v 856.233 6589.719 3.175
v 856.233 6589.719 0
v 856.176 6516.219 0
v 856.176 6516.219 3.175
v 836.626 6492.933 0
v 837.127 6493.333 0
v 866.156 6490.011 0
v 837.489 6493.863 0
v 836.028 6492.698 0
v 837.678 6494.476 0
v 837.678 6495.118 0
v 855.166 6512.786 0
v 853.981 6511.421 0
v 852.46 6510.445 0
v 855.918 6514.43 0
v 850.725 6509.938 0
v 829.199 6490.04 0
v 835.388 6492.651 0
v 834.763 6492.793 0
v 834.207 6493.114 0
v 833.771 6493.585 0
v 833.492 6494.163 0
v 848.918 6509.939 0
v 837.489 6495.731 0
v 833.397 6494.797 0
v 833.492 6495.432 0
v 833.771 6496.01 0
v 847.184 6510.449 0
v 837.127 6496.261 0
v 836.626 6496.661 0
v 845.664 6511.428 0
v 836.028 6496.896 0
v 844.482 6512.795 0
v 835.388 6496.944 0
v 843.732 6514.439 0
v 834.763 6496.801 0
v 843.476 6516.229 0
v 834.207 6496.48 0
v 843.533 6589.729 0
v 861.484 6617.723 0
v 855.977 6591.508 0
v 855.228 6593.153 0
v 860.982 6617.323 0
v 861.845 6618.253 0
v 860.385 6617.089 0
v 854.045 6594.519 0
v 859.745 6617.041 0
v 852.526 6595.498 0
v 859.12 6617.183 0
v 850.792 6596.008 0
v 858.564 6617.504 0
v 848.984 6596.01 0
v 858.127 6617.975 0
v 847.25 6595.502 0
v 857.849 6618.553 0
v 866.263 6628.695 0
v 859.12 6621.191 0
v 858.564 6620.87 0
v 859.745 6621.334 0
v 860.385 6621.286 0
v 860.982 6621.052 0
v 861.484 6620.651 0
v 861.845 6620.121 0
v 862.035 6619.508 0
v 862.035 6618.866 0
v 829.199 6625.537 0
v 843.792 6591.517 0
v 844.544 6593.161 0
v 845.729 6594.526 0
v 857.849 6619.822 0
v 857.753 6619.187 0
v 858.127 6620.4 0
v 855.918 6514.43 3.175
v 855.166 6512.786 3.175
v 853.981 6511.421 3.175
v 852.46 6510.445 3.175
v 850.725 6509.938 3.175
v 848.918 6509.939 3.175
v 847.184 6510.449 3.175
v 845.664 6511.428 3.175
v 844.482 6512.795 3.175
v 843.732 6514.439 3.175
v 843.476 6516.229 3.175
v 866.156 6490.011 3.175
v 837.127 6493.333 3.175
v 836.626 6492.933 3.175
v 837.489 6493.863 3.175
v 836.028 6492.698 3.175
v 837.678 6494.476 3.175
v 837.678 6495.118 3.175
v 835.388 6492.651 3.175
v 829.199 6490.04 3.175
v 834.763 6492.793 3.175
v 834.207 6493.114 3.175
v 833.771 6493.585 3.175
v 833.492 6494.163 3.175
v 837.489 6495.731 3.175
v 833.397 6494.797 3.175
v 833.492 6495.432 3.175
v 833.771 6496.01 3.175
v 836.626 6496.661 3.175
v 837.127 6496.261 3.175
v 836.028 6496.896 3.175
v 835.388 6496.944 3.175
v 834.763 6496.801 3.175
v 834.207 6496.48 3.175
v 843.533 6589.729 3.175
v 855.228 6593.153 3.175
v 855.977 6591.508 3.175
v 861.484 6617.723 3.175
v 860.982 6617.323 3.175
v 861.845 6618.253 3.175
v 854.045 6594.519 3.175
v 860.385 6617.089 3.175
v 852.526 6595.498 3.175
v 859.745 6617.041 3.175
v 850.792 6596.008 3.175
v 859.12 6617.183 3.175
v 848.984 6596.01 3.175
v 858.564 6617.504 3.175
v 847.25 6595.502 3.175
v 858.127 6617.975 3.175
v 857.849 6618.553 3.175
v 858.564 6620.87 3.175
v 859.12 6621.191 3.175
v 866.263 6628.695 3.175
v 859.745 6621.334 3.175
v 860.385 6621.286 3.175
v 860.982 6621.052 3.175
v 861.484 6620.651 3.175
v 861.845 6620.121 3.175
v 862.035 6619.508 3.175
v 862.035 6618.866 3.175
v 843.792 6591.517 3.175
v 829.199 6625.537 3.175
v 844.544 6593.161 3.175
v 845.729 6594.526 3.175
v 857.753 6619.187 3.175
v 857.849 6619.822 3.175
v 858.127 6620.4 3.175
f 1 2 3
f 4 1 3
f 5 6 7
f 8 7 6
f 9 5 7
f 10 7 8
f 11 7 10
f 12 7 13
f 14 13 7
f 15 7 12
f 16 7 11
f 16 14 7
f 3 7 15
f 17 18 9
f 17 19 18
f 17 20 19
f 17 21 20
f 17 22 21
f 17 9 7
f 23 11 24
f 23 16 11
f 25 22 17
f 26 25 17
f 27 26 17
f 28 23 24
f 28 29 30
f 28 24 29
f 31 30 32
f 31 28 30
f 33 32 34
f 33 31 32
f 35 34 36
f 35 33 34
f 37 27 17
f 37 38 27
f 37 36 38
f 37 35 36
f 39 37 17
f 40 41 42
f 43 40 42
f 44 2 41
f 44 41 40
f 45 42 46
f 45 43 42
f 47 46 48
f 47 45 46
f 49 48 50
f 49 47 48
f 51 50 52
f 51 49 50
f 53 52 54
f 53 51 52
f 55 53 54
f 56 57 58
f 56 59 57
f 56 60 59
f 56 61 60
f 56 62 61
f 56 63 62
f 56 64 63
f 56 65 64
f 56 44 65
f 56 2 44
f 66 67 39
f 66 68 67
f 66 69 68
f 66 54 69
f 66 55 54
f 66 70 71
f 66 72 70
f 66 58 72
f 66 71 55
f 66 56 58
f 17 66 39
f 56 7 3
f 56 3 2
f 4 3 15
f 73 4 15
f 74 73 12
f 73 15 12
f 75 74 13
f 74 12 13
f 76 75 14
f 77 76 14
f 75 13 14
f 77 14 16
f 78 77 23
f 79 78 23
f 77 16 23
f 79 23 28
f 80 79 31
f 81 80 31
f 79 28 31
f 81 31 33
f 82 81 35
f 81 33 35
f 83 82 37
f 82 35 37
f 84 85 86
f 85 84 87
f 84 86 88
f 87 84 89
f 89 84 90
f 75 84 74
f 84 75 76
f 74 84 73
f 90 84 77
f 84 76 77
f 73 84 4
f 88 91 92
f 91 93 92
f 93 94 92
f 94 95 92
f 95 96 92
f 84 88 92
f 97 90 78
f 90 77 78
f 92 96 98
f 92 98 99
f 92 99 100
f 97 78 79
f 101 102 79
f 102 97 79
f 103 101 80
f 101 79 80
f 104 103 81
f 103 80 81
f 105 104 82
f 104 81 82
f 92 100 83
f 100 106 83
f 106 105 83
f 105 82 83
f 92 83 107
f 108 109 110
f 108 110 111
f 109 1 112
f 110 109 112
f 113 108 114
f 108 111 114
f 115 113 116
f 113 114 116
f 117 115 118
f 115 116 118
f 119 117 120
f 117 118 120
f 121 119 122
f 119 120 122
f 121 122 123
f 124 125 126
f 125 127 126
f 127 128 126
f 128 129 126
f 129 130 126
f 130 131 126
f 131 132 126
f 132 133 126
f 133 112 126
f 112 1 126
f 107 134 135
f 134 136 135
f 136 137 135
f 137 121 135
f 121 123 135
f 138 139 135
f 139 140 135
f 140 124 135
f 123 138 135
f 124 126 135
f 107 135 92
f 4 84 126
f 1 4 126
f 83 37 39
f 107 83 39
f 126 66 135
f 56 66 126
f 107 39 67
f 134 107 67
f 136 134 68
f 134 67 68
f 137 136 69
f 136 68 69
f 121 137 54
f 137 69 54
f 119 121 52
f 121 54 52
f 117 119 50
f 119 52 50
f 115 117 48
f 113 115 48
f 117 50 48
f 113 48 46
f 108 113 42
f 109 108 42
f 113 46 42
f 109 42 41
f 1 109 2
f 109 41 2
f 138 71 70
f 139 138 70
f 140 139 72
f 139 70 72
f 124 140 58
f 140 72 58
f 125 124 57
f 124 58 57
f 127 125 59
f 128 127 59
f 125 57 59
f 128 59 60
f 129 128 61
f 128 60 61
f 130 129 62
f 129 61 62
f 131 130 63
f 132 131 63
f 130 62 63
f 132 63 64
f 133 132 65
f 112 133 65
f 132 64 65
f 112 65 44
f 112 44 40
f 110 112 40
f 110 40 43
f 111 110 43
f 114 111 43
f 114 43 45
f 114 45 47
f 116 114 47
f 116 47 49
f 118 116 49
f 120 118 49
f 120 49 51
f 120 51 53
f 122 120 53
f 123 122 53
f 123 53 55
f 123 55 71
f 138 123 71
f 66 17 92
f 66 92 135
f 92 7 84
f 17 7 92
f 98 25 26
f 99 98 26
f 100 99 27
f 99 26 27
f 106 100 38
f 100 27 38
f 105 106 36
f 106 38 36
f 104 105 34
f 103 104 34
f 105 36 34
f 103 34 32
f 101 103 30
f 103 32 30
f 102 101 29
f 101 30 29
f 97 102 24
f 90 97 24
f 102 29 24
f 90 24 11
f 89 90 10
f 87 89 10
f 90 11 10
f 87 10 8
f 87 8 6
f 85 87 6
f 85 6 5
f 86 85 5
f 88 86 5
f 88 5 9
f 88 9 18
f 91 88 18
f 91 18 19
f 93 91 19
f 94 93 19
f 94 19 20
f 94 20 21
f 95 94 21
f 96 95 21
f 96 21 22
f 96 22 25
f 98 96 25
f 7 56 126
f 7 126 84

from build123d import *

# Parameters (mm, degrees)
BOSS_EXTRUDE1_DEPTH   = 3.175
F_6_CLEARANCE_HOLE1_D = 4.3053


with BuildPart() as part:
    # Sketch1 → Boss-Extrude1 (new body)
    with BuildSketch(Plane.XY):
        Polygon((866.156250481, 6490.011012461), (829.199261489, 6490.03953741), (829.199261489, 6625.537287847), (866.263292559, 6628.694971151), align=None)
        with BuildLine():
            Line((856.233206108, 6589.718701179), (856.176475752, 6516.218723072))
            ThreePointArc((856.176475752, 6516.218723072), (849.821576449, 6509.873626158), (843.476479535, 6516.22852546))
            Line((843.476479535, 6516.22852546), (843.533209891, 6589.728503567))
            ThreePointArc((843.533209891, 6589.728503567), (849.888109194, 6596.073600482), (856.233206108, 6589.718701179))
        make_face(mode=Mode.SUBTRACT)
    extrude(amount=BOSS_EXTRUDE1_DEPTH)

    # #6 Clearance Hole1 (through all)
    with Locations(Plane.XY.offset(3.175)):
        with Locations((859.90595224, 6619.187287847), (835.549261489, 6494.797137633)):
            Hole(F_6_CLEARANCE_HOLE1_D / 2)


solid = part.part
